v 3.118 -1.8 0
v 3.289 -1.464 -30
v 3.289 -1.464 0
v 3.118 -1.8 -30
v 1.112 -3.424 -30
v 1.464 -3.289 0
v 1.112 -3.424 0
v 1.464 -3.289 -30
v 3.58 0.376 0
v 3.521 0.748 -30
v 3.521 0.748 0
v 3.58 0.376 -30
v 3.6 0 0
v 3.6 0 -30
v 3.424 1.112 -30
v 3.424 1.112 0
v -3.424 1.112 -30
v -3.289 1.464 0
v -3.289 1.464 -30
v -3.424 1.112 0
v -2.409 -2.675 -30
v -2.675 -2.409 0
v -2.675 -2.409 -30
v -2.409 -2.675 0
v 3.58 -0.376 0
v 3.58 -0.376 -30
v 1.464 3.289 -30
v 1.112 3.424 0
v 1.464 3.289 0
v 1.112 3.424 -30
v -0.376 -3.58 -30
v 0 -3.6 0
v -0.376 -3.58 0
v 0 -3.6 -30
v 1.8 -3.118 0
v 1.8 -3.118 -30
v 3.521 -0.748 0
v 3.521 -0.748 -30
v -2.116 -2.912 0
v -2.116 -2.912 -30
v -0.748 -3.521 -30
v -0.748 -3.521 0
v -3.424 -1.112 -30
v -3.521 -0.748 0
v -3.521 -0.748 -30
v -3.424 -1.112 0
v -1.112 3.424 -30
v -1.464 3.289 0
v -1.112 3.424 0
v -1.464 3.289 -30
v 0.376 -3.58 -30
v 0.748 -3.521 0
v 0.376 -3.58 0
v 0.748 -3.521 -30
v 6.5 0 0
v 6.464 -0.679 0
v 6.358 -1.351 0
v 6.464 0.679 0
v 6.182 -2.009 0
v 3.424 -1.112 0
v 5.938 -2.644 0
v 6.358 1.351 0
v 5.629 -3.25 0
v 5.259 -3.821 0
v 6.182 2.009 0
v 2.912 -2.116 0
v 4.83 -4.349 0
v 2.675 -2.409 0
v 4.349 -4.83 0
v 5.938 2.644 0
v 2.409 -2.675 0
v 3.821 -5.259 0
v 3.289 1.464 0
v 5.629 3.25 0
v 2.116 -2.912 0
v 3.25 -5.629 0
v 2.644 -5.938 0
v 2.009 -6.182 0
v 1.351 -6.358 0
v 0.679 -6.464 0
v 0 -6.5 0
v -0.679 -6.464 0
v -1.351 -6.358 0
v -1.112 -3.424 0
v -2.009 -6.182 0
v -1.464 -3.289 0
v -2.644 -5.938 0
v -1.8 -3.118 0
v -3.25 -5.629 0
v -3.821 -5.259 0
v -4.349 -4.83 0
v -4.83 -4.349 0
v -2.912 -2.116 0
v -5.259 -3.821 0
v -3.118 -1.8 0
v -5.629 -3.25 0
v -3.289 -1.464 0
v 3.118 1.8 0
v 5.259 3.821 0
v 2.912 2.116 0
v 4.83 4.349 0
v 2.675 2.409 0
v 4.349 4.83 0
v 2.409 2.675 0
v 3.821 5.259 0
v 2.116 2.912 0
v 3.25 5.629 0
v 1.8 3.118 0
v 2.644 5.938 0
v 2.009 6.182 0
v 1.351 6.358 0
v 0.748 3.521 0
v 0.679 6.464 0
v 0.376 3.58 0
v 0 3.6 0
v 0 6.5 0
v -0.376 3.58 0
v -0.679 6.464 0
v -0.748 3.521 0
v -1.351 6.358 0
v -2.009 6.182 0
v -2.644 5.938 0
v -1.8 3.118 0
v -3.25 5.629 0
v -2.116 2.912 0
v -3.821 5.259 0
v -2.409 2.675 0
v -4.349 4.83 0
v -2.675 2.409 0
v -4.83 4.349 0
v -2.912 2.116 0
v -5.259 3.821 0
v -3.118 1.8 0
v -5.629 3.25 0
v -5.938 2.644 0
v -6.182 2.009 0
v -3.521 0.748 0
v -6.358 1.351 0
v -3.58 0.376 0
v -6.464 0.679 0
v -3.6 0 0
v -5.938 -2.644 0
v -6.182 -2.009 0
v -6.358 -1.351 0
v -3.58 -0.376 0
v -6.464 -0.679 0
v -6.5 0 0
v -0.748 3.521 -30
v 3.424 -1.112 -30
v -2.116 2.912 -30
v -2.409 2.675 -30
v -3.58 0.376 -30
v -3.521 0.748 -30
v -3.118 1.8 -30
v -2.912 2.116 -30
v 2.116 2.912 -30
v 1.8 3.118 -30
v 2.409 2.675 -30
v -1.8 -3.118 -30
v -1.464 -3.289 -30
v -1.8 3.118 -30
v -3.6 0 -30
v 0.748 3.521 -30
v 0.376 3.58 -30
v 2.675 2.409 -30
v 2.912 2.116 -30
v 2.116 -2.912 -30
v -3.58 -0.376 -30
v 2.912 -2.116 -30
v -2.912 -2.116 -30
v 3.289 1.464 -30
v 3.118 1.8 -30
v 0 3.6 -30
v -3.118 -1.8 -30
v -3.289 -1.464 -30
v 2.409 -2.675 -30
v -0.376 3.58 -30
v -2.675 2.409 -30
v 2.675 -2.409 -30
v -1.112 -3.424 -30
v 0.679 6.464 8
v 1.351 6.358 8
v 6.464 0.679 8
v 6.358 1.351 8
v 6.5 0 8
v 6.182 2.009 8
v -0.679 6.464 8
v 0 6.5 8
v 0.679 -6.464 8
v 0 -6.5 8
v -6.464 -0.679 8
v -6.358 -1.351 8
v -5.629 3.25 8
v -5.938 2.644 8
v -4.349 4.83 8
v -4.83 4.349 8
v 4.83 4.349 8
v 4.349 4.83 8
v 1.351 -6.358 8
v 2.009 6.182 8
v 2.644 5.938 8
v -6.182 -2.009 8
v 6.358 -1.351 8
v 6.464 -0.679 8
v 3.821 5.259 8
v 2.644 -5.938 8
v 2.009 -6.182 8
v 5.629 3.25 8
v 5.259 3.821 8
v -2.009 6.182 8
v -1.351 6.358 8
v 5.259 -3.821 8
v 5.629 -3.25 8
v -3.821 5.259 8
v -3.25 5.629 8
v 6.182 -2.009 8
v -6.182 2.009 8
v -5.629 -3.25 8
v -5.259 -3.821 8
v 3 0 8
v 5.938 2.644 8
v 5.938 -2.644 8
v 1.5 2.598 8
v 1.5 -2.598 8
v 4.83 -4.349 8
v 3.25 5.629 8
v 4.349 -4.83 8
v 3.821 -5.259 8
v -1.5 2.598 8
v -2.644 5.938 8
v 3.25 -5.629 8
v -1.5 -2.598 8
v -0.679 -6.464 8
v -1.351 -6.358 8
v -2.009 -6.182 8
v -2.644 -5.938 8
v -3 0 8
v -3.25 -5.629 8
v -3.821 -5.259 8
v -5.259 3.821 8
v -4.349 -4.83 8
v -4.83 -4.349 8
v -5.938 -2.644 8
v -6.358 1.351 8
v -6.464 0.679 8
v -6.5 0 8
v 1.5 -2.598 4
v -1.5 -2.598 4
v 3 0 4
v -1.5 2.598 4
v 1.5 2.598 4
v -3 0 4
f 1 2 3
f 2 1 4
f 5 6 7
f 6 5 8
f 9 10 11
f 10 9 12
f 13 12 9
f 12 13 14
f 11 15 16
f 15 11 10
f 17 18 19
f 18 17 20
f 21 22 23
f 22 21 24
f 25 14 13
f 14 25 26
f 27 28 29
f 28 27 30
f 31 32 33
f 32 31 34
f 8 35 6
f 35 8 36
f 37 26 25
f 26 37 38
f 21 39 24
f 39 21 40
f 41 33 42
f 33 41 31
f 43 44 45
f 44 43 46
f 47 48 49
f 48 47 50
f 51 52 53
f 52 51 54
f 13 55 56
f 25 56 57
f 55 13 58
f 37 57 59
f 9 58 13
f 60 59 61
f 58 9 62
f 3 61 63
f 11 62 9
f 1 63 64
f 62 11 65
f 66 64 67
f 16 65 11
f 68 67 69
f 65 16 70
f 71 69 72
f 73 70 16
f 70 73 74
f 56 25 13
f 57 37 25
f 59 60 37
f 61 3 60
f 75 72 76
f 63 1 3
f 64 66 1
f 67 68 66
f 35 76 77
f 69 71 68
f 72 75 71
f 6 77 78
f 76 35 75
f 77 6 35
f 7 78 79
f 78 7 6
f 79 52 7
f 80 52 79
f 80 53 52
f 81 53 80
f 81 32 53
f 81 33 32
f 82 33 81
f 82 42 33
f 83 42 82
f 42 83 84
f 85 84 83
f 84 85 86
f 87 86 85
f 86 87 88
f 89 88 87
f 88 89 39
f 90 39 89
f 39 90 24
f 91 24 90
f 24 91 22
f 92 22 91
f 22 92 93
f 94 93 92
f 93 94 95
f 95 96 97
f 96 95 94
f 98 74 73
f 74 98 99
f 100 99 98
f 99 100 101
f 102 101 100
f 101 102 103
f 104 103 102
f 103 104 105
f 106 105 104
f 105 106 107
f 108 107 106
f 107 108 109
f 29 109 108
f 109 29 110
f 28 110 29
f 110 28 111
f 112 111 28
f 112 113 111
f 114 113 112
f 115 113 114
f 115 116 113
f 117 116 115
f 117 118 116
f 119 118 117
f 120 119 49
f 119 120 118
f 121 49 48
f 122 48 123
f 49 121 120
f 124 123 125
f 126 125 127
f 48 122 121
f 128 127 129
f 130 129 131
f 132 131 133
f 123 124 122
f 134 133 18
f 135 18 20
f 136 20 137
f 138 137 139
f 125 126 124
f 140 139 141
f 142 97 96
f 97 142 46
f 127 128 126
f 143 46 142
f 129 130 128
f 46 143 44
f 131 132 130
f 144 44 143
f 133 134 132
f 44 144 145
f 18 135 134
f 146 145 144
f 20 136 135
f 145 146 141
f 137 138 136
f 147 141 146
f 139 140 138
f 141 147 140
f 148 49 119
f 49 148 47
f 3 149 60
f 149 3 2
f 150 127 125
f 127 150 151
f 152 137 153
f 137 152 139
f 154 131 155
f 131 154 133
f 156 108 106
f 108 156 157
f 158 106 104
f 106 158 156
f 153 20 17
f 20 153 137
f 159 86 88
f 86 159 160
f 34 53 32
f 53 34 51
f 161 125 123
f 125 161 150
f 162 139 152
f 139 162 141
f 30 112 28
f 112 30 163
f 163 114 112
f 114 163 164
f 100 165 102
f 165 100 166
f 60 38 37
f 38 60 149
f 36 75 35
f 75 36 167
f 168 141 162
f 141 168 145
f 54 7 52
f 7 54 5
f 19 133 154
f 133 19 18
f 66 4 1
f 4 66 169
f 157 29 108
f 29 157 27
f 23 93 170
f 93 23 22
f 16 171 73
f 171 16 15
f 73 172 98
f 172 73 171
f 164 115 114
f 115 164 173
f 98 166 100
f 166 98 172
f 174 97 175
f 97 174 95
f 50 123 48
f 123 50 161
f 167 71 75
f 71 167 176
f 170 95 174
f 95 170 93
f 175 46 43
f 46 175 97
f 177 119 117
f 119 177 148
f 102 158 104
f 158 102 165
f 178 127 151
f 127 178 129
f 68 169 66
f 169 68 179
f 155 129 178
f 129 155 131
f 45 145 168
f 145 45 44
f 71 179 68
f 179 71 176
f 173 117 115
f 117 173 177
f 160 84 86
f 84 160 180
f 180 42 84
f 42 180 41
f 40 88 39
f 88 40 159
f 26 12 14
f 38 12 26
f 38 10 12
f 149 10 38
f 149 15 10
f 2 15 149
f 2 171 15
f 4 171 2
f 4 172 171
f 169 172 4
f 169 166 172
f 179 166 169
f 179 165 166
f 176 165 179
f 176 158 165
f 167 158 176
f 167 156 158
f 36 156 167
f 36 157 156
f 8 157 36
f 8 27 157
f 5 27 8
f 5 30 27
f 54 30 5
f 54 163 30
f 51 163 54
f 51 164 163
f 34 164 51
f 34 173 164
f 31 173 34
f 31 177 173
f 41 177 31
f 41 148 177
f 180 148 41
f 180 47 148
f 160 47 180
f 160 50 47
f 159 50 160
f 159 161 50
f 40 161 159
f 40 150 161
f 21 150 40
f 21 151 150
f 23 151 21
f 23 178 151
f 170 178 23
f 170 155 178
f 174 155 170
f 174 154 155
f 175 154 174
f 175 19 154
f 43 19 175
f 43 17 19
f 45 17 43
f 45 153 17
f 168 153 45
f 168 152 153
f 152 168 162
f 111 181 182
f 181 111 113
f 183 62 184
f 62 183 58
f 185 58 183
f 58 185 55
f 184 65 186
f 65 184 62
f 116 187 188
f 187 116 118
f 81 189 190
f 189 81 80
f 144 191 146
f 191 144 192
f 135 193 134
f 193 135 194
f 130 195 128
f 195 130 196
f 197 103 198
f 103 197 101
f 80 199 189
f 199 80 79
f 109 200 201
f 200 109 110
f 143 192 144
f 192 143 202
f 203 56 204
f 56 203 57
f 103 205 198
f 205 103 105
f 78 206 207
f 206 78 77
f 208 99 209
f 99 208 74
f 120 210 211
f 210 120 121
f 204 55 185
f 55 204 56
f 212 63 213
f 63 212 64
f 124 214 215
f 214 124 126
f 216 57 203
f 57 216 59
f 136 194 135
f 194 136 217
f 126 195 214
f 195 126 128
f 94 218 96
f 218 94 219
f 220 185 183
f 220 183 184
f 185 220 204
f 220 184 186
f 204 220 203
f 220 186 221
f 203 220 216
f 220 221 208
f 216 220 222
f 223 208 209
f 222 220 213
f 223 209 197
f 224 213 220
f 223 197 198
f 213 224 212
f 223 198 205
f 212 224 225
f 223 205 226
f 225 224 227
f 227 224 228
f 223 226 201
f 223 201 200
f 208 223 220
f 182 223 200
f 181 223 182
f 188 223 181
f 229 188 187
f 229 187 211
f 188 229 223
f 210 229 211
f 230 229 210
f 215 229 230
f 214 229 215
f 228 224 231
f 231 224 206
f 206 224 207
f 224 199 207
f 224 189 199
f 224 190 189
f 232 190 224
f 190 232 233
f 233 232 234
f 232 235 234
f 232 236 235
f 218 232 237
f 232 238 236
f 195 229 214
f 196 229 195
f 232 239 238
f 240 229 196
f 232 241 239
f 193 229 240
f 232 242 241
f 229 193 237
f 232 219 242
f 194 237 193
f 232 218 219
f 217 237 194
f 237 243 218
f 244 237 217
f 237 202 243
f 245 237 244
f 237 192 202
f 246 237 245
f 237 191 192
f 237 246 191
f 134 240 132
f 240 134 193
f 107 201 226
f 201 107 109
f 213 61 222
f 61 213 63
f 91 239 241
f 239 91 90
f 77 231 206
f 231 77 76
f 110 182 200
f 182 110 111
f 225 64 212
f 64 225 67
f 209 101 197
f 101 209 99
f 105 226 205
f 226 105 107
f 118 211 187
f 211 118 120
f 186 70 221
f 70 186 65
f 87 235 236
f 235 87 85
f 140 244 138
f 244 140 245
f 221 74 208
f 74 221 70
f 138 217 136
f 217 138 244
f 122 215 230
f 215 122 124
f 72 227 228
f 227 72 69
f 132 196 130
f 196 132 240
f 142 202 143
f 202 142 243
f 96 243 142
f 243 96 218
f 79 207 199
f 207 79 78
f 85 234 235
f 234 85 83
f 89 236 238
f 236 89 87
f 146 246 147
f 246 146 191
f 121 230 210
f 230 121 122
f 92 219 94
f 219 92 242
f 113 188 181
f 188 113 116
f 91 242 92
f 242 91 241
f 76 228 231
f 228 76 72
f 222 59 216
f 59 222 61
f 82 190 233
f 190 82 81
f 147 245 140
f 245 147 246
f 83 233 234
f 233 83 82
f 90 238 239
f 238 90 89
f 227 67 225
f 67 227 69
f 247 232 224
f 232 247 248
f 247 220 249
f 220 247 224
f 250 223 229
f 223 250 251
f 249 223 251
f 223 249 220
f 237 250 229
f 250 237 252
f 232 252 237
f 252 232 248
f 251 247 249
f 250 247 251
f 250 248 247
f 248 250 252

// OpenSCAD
/*
DIN 912 Z GWINTEM PO CAŁOŚCI
*/

$fn = 60;

DIN912(8,30);
module DIN912(gwint,dlugosc)
{
    //Parametry śruby:
    {
        //Parametry śruby:
        //szerokość łba
        function dk(gwint) = lookup(gwint, [[3,5.5],[4,7],[5,8.5],[6,10],[8,13],[10,16],[12,18],[14,21],[16,24],[20,30]]);
        dk=dk(gwint);
        //grubość łba
        function k(gwint) = lookup(gwint, [[3,3],[4,4],[5,5],[6,6],[8,8],[10,10],[12,12],[14,14],[16,16],[20,20]]);
        k=k(gwint);
        //gniazdo 60-kątne
        function s(gwint) = lookup(gwint, [[3,2.5],[4,3],[5,4],[6,5],[8,6],[10,8],[12,10],[14,12],[16,14],[20,17]]);
        s=s(gwint);
        //Długość części gwintowanej
        //L=[3,5-30],[4,6-40],[5,8-50],[6,10-60],[8,12-80],[10,16-100],[12,20-120],[14,25-140]
        //Definicja kolorów
        aluminum = [0.9, 0.9, 0.9];
        steel = [0.8, 0.8, 0.9];
    }
    
{
    color(steel,1)
                            translate([0, 0, -dlugosc])
            difference() 
    {
            union()
    {

    cylinder(h=dlugosc, d=gwint*0.9, center=false);
    
            translate([0, 0, dlugosc])
        cylinder(h=k, d=dk, center=false);
    }
                translate([0, 0, dlugosc+k])
        cylinder(h=k, d=s,$fn=6,center = true);
}
}
}
